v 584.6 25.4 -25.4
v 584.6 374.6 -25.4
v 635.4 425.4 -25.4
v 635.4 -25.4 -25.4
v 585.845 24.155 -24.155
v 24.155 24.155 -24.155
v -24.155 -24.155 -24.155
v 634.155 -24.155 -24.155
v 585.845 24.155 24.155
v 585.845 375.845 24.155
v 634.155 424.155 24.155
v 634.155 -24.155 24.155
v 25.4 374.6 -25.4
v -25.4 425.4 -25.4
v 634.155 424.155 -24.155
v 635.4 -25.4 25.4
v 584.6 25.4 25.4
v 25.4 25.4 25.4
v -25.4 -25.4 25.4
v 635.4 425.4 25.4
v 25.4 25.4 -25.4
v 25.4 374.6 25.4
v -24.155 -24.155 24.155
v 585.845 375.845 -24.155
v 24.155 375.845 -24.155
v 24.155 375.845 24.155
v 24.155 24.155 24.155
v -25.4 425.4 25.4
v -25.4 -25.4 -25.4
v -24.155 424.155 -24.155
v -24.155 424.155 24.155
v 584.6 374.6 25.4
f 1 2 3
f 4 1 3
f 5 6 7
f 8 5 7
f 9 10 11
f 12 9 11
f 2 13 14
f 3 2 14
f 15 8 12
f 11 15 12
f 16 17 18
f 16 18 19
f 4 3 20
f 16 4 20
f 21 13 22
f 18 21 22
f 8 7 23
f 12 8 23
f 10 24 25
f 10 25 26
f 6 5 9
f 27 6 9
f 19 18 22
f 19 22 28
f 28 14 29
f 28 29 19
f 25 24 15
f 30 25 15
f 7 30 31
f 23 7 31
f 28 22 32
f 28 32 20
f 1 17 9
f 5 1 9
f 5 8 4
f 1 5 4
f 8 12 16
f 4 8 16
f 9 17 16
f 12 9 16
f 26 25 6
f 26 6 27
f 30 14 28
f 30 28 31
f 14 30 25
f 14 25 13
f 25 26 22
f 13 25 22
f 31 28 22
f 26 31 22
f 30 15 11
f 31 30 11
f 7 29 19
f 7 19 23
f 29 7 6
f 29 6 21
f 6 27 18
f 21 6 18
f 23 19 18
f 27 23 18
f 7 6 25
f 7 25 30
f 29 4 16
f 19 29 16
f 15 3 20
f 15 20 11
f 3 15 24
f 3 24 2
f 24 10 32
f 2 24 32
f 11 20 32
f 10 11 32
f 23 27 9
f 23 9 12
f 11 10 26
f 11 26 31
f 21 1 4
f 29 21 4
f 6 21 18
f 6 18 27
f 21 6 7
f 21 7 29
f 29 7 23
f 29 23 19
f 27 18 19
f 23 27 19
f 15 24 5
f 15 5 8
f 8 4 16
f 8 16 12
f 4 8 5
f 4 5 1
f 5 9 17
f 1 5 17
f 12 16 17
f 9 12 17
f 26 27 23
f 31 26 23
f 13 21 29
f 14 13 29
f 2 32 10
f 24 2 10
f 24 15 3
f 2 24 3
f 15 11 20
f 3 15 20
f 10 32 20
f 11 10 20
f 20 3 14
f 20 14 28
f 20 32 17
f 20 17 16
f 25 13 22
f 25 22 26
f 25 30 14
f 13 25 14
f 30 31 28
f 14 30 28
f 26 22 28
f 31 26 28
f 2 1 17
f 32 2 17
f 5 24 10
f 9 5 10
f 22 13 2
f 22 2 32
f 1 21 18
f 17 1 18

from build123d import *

# Parameters (mm, degrees)
AL_TUBE_SQUARE_2_SQ_X_049_WALL_1_DEPTH      = 436.921024484
AL_TUBE_SQUARE_2_SQ_X_049_WALL_1_DEPTH_BACK = 36.921024484
SKETCH1_W                                   = 50.8
SKETCH1_H                                   = 50.8
SKETCH1_W_2                                 = 48.3108
SKETCH1_H_2                                 = 48.3108
SKETCH1_ON_SEGMENT_2_W                      = 50.8
SKETCH1_ON_SEGMENT_2_H                      = 50.8
SKETCH1_ON_SEGMENT_2_W_2                    = 48.3108
SKETCH1_ON_SEGMENT_2_H_2                    = 48.3108
AL_TUBE_SQUARE_2_SQ_X_049_WALL_1_3_DEPTH    = 683.842048969
SKETCH1_ON_SEGMENT_3_W                      = 50.8
SKETCH1_ON_SEGMENT_3_H                      = 50.8
SKETCH1_ON_SEGMENT_3_W_2                    = 48.3108
SKETCH1_ON_SEGMENT_3_H_2                    = 48.3108
AL_TUBE_SQUARE_2_SQ_X_049_WALL_1_5_DEPTH    = 473.842048969
SKETCH1_ON_SEGMENT_4_W                      = 50.8
SKETCH1_ON_SEGMENT_4_H                      = 50.8
SKETCH1_ON_SEGMENT_4_W_2                    = 48.3108
SKETCH1_ON_SEGMENT_4_H_2                    = 48.3108
AL_TUBE_SQUARE_2_SQ_X_049_WALL_1_7_DEPTH    = 683.842048969


with BuildPart() as part:
    # Sketch1 → Al tube (square) 2 SQ X .049 WALL(1) (new, two sides: drawn at the far end of the back side and taken through both)
    with BuildSketch(Plane(origin=(0, 0, 0), x_dir=(-1, 0, 0), z_dir=(0, 1, 0)).offset(-AL_TUBE_SQUARE_2_SQ_X_049_WALL_1_DEPTH_BACK)):
        Rectangle(SKETCH1_W, SKETCH1_H)
        Rectangle(SKETCH1_W_2, SKETCH1_H_2, mode=Mode.SUBTRACT)
    extrude(amount=AL_TUBE_SQUARE_2_SQ_X_049_WALL_1_DEPTH + AL_TUBE_SQUARE_2_SQ_X_049_WALL_1_DEPTH_BACK)

    # Al tube (square) 2 SQ X .049 WALL(1) mitr
    split(bisect_by=Plane(origin=(0, 0, 0), x_dir=(-0.707106781, -0.707106781, 0), z_dir=(-0.707106781, 0.707106781, 0)), keep=Keep.TOP)

    # Al tube (square) 2 SQ X .049 WALL(1)  2
    split(bisect_by=Plane(origin=(0, 400, 0), x_dir=(0.707106781, -0.707106781, 0), z_dir=(-0.707106781, -0.707106781, 0)), keep=Keep.TOP)


with BuildPart() as body_2:
    # Sketch1 on segment 2 (carried to segment 2) → Al tube (square) 2 SQ X .049 WALL(1)  3 (new body)
    with BuildSketch(Plane(origin=(-36.921024484, 400, 0), x_dir=(0, 1, 0), z_dir=(1, 0, 0))):
        Rectangle(SKETCH1_ON_SEGMENT_2_W, SKETCH1_ON_SEGMENT_2_H)
        Rectangle(SKETCH1_ON_SEGMENT_2_W_2, SKETCH1_ON_SEGMENT_2_H_2, mode=Mode.SUBTRACT)
    extrude(amount=AL_TUBE_SQUARE_2_SQ_X_049_WALL_1_3_DEPTH)

    # Al tube _square_ 2 SQ X .049 WALL_1 3 mi
    split(bisect_by=Plane(origin=(0, 400, 0), x_dir=(-0.707106781, 0.707106781, 0), z_dir=(0.707106781, 0.707106781, 0)), keep=Keep.TOP)

    # Al tube (square) 2 SQ X .049 WALL(1)  4
    split(bisect_by=Plane(origin=(610, 400, 0), x_dir=(-0.707106781, -0.707106781, 0), z_dir=(-0.707106781, 0.707106781, 0)), keep=Keep.TOP)


with BuildPart() as body_3:
    # Sketch1 on segment 3 (carried to segment 3) → Al tube (square) 2 SQ X .049 WALL(1)  5 (new body)
    with BuildSketch(Plane(origin=(610, 436.921024484, 0), x_dir=(1, 0, 0), z_dir=(0, -1, 0))):
        Rectangle(SKETCH1_ON_SEGMENT_3_W, SKETCH1_ON_SEGMENT_3_H)
        Rectangle(SKETCH1_ON_SEGMENT_3_W_2, SKETCH1_ON_SEGMENT_3_H_2, mode=Mode.SUBTRACT)
    extrude(amount=AL_TUBE_SQUARE_2_SQ_X_049_WALL_1_5_DEPTH)

    # Al tube _square_ 2 SQ X .049 WALL_1 5 mi
    split(bisect_by=Plane(origin=(610, 0, 0), x_dir=(-0.707106781, 0.707106781, 0), z_dir=(0.707106781, 0.707106781, 0)), keep=Keep.TOP)

    # Al tube (square) 2 SQ X .049 WALL(1)  6
    split(bisect_by=Plane(origin=(610, 400, 0), x_dir=(0.707106781, 0.707106781, 0), z_dir=(0.707106781, -0.707106781, 0)), keep=Keep.TOP)


with BuildPart() as body_4:
    # Sketch1 on segment 4 (carried to segment 4) → Al tube (square) 2 SQ X .049 WALL(1)  7 (new body)
    with BuildSketch(Plane(origin=(646.921024484, 0, 0), x_dir=(0, -1, 0), z_dir=(-1, 0, 0))):
        Rectangle(SKETCH1_ON_SEGMENT_4_W, SKETCH1_ON_SEGMENT_4_H)
        Rectangle(SKETCH1_ON_SEGMENT_4_W_2, SKETCH1_ON_SEGMENT_4_H_2, mode=Mode.SUBTRACT)
    extrude(amount=AL_TUBE_SQUARE_2_SQ_X_049_WALL_1_7_DEPTH)

    # Al tube _square_ 2 SQ X .049 WALL_1 7 mi
    split(bisect_by=Plane(origin=(0, 0, 0), x_dir=(0.707106781, 0.707106781, 0), z_dir=(0.707106781, -0.707106781, 0)), keep=Keep.TOP)

    # Al tube (square) 2 SQ X .049 WALL(1)  8
    split(bisect_by=Plane(origin=(610, 0, 0), x_dir=(0.707106781, -0.707106781, 0), z_dir=(-0.707106781, -0.707106781, 0)), keep=Keep.TOP)


solid = Compound([part.part, body_2.part, body_3.part, body_4.part])
